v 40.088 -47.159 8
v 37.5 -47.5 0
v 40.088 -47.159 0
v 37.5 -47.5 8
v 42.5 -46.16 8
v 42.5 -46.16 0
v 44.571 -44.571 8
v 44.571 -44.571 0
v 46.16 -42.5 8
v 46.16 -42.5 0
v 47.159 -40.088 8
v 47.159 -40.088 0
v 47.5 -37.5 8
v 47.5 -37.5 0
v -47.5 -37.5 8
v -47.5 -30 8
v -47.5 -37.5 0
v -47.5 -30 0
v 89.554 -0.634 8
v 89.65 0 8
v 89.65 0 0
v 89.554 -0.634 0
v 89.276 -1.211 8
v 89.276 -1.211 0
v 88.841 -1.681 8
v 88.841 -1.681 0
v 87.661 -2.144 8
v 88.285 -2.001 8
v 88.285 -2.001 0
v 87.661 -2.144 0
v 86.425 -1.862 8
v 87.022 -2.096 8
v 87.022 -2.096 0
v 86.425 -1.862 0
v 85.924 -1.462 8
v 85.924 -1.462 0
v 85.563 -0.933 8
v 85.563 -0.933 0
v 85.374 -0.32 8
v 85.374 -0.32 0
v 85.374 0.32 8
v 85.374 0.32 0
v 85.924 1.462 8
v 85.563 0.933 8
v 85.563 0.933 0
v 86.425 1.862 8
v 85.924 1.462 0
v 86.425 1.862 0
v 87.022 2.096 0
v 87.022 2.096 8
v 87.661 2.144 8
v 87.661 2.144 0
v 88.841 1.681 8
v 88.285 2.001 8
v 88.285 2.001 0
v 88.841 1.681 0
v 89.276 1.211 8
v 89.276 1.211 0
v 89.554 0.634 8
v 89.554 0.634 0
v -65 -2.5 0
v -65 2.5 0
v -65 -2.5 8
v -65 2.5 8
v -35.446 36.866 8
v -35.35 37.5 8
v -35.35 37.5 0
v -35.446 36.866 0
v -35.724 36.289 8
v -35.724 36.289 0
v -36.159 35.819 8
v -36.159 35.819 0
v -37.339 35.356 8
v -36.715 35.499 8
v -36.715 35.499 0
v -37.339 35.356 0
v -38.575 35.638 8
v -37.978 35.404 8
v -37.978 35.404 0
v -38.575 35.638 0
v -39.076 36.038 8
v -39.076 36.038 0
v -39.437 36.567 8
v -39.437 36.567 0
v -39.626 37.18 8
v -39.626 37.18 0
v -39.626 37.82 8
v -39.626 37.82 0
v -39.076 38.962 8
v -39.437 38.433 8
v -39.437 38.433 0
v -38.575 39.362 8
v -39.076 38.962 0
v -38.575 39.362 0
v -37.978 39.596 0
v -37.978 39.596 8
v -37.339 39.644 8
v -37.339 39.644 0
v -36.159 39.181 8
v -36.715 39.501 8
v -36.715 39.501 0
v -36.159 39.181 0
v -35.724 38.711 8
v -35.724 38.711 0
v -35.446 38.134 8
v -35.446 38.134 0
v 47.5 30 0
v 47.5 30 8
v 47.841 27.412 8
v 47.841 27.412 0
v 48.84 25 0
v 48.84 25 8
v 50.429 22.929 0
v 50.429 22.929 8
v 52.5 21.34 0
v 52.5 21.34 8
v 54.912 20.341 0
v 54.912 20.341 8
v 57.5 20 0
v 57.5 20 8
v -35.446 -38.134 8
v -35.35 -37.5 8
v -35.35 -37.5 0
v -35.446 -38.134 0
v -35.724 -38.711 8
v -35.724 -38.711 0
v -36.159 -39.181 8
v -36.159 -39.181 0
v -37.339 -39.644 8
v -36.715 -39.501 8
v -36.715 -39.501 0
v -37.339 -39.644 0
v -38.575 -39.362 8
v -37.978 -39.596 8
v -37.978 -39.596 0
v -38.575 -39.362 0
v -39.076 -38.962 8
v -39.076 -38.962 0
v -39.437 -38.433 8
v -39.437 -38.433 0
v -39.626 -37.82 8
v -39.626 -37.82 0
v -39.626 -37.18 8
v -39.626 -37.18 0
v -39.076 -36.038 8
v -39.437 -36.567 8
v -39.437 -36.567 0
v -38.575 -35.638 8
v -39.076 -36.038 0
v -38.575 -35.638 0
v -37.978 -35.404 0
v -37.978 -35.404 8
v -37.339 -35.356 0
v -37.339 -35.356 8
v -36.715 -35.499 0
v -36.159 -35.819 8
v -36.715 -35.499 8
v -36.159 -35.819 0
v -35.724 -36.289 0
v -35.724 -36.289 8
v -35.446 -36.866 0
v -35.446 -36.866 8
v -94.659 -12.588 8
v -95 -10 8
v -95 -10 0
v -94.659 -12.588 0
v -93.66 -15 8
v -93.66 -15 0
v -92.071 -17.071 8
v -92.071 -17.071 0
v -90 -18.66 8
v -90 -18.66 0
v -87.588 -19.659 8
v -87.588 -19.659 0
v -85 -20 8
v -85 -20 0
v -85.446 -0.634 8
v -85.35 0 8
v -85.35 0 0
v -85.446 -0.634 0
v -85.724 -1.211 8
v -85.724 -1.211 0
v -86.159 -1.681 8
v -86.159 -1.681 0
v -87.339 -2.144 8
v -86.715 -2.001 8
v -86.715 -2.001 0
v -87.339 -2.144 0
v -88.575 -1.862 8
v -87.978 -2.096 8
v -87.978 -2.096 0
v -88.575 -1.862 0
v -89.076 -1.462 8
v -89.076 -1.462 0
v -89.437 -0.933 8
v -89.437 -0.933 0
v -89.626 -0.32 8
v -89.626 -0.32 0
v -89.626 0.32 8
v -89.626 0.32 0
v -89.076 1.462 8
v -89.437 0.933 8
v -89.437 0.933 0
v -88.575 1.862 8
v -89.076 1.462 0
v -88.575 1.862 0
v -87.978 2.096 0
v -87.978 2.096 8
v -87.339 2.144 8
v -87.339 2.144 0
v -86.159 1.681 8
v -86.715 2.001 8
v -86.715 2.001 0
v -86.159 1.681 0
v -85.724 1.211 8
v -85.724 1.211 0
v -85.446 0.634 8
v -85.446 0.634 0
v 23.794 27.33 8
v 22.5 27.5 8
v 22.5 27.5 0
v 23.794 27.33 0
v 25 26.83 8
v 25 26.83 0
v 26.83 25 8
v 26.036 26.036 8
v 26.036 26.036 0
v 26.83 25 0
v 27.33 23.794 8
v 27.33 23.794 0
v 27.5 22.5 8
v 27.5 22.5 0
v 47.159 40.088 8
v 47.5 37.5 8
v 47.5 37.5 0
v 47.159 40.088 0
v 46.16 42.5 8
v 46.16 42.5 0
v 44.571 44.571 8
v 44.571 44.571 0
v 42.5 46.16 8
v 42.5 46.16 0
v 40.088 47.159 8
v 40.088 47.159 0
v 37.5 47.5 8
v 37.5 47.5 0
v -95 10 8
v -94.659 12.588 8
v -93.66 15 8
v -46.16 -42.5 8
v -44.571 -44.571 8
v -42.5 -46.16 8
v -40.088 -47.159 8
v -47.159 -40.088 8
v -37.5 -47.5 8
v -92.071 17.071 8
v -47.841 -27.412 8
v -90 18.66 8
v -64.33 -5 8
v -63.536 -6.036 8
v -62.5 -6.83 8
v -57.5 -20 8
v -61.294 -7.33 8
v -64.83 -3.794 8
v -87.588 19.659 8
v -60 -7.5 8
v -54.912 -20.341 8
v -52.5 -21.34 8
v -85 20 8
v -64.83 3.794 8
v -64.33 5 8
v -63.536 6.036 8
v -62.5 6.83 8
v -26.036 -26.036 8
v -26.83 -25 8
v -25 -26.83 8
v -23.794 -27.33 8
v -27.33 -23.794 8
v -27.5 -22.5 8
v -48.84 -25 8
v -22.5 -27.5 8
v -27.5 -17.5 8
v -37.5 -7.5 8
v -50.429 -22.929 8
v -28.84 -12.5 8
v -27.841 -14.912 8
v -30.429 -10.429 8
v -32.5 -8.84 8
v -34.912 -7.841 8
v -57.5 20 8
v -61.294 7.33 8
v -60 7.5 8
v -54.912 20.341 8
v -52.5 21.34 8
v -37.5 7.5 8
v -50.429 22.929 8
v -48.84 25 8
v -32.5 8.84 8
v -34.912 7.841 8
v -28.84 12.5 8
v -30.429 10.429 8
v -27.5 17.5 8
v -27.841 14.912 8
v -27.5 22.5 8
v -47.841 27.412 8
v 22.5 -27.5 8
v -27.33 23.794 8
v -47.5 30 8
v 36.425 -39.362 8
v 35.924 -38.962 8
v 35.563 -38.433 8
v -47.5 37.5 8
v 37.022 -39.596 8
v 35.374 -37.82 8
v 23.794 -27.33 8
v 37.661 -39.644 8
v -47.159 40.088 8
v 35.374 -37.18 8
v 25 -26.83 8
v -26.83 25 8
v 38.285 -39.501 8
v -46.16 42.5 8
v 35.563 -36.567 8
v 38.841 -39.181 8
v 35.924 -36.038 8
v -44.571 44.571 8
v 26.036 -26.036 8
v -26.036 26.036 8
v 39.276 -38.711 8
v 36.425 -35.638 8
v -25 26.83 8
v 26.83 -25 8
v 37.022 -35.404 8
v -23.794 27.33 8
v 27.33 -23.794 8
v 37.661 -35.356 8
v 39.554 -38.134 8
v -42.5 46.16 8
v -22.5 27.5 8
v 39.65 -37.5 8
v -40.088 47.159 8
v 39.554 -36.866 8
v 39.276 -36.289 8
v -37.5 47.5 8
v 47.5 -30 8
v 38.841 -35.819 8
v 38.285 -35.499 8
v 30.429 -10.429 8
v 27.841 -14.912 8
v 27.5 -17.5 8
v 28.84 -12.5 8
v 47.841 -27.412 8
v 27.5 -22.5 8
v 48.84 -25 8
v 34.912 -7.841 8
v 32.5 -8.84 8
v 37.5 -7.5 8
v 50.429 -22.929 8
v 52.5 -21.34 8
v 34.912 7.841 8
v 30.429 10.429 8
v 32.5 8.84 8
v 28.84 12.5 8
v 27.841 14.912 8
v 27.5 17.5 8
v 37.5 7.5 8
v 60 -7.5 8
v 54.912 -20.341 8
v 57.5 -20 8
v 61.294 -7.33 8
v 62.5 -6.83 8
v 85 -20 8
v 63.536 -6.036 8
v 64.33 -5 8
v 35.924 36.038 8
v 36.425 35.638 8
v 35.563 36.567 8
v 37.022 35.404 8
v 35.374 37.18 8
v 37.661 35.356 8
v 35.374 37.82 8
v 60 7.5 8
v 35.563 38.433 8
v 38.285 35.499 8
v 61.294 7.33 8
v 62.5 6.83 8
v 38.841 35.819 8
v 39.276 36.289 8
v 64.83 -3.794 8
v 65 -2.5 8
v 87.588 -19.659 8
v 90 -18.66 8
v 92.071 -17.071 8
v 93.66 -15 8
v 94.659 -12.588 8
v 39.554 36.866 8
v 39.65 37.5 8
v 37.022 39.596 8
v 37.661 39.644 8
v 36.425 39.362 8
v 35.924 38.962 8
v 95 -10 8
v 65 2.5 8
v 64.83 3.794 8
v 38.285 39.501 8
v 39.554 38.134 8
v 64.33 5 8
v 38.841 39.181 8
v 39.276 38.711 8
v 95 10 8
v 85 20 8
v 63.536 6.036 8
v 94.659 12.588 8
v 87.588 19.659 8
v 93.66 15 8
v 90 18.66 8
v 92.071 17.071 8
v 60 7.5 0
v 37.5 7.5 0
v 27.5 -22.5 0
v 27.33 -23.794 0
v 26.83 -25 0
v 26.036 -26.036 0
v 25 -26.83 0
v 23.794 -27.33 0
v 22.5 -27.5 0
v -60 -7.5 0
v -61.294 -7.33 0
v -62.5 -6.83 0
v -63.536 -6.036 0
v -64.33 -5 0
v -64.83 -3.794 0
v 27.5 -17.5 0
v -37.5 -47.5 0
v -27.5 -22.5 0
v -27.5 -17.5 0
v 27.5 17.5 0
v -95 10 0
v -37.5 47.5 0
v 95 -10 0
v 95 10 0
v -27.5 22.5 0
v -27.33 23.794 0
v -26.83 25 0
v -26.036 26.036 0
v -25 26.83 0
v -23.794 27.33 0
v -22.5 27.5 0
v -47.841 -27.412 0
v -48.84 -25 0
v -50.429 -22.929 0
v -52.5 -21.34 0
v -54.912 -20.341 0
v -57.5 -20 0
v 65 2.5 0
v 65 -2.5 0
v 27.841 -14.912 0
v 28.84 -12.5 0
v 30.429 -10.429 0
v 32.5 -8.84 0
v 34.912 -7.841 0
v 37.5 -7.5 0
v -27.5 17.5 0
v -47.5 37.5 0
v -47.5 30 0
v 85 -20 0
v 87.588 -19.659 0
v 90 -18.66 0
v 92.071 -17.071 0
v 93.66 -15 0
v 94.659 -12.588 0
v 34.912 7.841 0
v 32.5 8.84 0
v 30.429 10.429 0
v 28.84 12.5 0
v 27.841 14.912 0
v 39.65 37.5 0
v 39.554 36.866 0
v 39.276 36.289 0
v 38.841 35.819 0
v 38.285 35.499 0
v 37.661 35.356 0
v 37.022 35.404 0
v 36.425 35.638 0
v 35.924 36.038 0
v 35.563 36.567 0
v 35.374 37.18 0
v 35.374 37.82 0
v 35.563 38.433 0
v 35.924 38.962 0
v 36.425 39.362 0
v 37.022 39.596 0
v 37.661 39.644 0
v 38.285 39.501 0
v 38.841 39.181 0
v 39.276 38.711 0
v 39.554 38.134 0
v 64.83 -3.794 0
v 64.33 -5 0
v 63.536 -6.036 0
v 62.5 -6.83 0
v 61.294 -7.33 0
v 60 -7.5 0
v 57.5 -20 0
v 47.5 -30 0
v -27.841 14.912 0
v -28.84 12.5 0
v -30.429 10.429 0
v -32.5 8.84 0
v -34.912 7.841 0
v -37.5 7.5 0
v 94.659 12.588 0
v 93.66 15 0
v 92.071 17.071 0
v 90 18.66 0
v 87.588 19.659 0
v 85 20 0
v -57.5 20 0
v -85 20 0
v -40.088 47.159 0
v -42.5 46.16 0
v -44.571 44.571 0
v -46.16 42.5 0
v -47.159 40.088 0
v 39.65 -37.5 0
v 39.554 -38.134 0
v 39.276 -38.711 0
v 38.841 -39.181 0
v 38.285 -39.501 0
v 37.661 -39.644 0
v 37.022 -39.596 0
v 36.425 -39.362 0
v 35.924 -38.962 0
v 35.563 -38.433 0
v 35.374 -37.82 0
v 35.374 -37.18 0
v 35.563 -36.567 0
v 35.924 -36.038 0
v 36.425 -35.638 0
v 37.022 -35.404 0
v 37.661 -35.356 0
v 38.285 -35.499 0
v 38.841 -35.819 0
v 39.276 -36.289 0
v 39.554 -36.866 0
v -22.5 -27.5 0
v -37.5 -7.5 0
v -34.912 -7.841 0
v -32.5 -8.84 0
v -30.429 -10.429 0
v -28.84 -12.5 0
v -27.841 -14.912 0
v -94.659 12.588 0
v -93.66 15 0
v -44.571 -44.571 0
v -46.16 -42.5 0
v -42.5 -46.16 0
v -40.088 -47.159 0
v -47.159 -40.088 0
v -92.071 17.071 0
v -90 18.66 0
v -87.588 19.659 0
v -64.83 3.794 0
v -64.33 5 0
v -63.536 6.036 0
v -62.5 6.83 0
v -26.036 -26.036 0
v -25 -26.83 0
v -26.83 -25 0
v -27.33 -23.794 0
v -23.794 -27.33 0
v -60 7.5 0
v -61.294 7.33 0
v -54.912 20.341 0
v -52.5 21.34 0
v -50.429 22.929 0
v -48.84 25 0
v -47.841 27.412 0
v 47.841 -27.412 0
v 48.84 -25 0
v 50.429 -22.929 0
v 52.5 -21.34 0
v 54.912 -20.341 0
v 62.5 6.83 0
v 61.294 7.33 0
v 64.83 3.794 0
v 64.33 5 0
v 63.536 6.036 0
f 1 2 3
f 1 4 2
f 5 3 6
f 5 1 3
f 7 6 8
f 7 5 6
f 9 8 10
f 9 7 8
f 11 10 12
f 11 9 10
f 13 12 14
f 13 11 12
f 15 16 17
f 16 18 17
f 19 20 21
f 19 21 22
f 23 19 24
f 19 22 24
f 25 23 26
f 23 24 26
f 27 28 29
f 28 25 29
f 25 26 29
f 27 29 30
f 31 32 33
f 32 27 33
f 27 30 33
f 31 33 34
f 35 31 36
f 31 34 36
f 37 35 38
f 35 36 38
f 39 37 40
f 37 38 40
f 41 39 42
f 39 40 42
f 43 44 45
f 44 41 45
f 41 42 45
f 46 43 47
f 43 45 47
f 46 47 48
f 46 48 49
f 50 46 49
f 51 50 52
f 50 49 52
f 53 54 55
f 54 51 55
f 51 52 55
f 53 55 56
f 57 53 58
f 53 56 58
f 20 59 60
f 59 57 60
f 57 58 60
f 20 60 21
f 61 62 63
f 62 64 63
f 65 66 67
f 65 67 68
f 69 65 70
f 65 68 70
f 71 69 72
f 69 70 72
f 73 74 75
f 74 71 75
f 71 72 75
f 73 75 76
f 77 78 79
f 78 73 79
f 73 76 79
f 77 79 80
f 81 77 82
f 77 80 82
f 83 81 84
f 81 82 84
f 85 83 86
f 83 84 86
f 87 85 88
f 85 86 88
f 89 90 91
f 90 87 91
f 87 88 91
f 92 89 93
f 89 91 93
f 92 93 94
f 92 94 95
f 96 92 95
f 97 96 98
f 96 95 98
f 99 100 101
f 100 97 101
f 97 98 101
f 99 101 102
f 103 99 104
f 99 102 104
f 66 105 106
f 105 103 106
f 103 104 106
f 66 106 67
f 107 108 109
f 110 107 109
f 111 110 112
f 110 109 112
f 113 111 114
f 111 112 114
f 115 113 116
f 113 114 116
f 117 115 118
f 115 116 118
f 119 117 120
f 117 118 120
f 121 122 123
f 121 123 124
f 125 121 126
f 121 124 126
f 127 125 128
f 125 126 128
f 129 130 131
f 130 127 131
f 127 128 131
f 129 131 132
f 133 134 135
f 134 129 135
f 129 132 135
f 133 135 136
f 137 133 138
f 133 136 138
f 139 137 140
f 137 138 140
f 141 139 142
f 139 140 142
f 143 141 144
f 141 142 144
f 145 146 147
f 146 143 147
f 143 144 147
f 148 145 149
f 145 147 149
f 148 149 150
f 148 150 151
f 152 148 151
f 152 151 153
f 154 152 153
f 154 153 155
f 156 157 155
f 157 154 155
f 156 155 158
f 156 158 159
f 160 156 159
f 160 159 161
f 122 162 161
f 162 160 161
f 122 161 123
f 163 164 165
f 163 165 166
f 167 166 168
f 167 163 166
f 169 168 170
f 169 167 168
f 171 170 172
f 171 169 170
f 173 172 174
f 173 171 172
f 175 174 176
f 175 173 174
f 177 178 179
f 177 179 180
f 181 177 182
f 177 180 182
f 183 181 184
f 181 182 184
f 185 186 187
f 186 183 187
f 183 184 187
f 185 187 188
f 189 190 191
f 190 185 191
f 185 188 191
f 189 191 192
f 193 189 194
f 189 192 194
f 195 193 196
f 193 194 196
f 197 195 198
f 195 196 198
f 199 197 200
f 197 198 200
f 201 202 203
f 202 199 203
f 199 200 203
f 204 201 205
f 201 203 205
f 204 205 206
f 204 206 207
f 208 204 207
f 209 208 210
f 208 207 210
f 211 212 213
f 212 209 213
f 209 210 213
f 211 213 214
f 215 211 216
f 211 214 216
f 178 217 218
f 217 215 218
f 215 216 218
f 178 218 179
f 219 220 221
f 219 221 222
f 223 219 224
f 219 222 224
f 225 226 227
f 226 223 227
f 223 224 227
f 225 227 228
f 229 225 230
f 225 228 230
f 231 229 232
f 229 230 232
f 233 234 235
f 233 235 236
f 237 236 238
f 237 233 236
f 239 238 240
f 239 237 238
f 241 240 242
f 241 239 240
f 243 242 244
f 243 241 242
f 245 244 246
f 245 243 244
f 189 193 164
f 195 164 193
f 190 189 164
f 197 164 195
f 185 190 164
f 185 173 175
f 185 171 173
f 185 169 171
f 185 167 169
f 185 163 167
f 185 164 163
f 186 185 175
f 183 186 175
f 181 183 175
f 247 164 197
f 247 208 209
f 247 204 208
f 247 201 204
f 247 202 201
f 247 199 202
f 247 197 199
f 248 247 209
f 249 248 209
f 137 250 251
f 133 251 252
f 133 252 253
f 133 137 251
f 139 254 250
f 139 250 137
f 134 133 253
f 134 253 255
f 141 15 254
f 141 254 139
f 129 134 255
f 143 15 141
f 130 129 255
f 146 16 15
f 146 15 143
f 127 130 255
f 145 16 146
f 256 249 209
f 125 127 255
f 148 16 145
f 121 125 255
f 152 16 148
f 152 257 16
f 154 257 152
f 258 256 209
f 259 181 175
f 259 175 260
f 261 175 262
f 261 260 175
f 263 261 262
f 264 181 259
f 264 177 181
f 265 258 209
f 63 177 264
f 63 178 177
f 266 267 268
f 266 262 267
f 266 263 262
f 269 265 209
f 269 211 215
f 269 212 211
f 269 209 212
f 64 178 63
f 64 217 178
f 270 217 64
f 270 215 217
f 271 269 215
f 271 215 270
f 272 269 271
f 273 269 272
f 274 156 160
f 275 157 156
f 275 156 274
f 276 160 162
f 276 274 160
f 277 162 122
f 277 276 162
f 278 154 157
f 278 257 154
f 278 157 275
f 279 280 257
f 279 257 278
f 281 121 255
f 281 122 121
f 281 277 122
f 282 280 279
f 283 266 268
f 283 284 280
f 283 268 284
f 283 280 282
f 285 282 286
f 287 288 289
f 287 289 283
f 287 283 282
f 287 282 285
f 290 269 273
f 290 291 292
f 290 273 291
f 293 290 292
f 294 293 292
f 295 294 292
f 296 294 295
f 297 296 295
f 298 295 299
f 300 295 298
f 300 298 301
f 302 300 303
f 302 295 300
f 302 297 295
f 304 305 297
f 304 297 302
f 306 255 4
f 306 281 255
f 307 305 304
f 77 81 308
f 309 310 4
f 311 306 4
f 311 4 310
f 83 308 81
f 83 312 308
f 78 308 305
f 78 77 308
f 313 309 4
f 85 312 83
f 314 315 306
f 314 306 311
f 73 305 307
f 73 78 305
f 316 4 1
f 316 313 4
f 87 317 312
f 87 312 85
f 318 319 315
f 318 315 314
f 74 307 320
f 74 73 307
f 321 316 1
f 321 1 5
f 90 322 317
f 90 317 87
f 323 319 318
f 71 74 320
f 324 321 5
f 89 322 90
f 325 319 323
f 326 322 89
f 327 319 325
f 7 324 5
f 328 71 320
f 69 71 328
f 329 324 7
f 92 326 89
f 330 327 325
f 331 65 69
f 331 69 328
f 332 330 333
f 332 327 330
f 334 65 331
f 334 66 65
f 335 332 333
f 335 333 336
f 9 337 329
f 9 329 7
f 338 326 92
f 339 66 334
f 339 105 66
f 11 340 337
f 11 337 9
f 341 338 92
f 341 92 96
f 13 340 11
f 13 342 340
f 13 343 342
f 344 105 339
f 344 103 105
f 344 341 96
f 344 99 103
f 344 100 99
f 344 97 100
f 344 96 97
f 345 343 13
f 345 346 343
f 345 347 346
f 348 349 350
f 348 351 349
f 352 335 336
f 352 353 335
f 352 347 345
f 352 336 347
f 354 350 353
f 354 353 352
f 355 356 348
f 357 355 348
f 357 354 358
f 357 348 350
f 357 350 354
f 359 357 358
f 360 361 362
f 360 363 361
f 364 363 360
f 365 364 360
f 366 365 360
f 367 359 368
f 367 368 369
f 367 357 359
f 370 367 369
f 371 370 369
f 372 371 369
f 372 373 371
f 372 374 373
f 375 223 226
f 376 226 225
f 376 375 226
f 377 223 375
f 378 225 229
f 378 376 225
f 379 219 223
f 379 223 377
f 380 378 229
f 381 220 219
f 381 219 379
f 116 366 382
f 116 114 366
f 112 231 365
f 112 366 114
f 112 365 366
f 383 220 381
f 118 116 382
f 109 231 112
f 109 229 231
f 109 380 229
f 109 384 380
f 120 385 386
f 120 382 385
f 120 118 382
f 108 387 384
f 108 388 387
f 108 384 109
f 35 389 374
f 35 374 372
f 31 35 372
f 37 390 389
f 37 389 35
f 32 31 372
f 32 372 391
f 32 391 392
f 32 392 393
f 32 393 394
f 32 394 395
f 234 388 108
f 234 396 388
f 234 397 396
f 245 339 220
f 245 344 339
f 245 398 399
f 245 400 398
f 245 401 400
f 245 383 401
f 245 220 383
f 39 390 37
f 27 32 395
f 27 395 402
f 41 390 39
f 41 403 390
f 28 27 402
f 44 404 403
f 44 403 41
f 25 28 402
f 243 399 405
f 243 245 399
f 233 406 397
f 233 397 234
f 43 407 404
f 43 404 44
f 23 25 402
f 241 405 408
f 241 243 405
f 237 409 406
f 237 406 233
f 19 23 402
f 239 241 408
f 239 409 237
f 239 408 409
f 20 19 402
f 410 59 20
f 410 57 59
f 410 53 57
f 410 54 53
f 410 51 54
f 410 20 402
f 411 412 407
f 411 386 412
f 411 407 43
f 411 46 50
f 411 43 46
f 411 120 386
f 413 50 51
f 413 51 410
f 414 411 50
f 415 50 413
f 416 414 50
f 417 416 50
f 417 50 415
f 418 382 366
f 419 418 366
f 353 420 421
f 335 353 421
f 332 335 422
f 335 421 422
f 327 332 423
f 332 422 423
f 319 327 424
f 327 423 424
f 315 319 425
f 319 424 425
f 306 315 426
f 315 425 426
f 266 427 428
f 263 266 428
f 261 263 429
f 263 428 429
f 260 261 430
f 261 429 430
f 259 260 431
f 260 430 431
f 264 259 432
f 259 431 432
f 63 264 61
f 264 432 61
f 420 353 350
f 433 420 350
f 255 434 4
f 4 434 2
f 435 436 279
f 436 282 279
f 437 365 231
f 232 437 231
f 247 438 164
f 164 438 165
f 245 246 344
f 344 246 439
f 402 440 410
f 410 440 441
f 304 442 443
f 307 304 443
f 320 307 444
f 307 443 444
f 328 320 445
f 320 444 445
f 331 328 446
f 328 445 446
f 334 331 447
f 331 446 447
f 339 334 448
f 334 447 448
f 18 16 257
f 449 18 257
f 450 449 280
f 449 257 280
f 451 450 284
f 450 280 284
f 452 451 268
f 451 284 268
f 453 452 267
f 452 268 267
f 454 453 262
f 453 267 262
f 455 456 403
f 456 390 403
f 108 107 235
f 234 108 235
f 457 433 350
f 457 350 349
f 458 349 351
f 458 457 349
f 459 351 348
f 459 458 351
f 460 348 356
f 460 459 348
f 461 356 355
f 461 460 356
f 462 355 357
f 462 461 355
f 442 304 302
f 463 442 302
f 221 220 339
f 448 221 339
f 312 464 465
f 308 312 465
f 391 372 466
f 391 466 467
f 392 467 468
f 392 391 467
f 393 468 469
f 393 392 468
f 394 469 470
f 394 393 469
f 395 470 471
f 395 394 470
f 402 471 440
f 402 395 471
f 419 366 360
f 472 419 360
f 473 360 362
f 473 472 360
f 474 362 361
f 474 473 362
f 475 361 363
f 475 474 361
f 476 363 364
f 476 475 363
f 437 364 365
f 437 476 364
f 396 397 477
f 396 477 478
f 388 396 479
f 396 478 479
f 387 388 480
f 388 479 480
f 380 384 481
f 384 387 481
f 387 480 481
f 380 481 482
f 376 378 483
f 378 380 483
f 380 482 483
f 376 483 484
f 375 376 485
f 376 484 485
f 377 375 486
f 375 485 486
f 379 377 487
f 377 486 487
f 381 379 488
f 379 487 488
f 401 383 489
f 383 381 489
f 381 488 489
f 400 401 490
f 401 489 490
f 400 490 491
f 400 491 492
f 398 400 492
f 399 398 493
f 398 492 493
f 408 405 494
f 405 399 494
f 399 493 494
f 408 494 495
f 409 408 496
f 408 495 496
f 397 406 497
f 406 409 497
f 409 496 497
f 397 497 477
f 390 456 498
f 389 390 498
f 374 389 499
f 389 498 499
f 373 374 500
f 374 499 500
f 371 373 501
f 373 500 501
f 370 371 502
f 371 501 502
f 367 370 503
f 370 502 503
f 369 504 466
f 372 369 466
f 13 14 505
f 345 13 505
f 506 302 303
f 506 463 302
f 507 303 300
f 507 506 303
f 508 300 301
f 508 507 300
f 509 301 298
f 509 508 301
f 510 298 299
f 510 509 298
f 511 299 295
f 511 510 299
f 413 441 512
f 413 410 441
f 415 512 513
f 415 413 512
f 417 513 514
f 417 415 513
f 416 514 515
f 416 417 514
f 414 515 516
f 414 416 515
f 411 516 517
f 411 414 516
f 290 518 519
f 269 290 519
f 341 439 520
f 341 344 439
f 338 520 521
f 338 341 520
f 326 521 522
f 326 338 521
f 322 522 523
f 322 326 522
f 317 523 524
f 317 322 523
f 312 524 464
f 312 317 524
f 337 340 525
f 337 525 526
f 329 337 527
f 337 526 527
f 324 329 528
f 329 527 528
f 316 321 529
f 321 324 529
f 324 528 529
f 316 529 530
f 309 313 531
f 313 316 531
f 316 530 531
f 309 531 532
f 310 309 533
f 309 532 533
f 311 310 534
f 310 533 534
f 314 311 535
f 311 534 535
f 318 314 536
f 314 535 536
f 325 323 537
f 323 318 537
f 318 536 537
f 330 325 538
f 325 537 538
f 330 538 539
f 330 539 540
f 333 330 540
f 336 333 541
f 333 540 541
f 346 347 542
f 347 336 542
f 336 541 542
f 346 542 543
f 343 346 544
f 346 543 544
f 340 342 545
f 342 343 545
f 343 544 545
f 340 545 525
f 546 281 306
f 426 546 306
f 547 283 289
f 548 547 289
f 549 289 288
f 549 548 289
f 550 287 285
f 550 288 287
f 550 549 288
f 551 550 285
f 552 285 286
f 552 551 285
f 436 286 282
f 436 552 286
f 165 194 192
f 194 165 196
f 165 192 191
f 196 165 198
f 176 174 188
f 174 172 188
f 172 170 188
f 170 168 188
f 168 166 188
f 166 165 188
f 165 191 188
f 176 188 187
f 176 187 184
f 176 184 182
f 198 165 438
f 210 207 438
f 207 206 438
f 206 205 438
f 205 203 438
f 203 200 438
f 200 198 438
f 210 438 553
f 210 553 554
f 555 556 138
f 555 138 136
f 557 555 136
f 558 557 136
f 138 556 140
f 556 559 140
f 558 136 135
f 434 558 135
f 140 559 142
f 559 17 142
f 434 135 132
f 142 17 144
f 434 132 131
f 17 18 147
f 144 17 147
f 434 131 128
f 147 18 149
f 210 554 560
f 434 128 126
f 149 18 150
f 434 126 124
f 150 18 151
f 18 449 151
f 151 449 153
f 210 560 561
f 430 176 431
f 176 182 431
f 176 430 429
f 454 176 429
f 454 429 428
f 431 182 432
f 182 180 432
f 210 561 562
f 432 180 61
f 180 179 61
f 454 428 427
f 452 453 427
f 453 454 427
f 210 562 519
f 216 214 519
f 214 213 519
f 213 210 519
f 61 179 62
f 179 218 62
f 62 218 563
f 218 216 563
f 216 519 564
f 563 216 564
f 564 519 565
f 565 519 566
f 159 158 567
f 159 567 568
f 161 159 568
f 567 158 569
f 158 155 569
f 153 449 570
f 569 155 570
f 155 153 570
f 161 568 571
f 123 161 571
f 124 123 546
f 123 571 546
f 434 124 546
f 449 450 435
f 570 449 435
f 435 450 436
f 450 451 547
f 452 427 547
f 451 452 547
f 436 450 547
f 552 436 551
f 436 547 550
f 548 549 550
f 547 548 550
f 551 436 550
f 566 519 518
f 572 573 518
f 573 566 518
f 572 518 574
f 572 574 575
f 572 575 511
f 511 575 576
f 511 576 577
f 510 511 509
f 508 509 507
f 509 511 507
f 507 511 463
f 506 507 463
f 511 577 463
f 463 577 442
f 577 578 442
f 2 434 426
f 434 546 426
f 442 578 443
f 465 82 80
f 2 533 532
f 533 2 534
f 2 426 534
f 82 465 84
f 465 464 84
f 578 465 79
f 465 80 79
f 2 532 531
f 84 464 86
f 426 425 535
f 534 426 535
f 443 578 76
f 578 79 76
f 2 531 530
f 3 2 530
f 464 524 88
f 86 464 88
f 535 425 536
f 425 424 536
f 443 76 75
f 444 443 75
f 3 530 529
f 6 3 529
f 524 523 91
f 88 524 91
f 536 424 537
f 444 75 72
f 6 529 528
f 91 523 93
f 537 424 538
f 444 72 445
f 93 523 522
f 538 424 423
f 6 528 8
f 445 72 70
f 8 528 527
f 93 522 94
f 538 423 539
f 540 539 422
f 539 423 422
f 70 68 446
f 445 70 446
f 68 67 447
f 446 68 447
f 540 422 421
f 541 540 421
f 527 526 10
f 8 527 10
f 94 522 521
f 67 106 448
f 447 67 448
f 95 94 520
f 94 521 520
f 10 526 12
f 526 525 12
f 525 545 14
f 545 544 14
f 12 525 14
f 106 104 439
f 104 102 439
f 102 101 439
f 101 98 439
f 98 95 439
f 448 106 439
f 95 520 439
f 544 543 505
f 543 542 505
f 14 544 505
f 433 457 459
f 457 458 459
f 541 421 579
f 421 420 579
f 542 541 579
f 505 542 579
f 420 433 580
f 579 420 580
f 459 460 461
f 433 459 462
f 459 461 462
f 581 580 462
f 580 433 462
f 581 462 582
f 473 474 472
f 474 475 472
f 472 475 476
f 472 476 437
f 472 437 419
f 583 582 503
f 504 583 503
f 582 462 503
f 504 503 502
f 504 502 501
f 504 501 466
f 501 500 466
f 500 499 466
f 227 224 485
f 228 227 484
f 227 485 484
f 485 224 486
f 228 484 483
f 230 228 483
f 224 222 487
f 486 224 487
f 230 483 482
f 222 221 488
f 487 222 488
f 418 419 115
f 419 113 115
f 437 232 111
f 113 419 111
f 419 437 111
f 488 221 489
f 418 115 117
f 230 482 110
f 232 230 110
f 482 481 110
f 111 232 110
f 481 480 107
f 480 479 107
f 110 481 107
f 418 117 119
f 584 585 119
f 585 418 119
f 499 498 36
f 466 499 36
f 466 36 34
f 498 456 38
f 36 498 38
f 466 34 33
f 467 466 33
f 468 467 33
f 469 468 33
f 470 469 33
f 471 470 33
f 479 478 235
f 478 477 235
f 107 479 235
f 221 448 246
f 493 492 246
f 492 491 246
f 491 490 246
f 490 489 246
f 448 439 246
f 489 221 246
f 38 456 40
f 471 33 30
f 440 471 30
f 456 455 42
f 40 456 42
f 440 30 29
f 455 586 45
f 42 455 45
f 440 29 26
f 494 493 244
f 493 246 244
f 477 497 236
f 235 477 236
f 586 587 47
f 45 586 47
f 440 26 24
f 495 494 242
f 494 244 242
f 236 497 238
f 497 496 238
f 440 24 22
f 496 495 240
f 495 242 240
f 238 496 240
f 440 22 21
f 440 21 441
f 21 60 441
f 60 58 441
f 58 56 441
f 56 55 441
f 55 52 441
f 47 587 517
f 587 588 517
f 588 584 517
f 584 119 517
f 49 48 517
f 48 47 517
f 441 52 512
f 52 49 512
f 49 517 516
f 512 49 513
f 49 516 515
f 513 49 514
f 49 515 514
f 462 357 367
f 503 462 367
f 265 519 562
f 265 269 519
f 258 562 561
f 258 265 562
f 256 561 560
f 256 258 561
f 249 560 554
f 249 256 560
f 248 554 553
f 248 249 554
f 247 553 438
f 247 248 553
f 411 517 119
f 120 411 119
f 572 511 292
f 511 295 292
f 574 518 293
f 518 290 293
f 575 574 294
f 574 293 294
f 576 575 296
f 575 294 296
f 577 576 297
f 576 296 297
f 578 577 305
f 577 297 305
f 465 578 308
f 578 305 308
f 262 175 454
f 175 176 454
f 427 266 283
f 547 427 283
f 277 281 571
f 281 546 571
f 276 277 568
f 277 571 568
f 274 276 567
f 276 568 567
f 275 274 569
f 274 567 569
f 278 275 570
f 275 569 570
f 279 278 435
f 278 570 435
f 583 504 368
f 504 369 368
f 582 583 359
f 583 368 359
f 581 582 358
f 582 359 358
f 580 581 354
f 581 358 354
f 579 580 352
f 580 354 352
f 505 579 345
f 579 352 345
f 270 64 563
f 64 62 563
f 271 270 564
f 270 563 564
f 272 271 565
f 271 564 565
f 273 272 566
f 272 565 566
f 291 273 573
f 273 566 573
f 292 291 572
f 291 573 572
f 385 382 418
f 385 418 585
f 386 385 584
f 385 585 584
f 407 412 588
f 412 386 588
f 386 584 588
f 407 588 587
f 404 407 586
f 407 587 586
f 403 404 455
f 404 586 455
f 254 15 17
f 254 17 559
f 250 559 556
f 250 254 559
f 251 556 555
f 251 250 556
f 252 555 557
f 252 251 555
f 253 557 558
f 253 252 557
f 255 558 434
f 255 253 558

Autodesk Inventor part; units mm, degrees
ref_plane "YZ Plane" through (0, 0, 0) normal (1, 0, 0) x (0, 1, 0)
ref_plane "XZ Plane" through (0, 0, 0) normal (0, 1, 0) x (-1, 0, 0)
ref_plane "XY Plane" through (0, 0, 0) normal (0, 0, 1) x (1, 0, 0)
sketch "Sketch1" plane through (0, 0, 0) normal (0, 0, 1) x (1, 0, 0)
  line L0 (-50, -50) -> (50, -50) construction
  line L1 (50, -50) -> (50, 50) construction
  line L2 (50, 50) -> (-50, 50) construction
  line L3 (-50, 50) -> (-50, -50) construction
  line L4 (-50, -50) -> (50, 50) construction
  line L5 (50, -50) -> (-50, 50) construction
  line L6 (-37.5, -37.5) -> (37.5, -37.5) construction
  line L7 (37.5, -37.5) -> (37.5, 37.5) construction
  line L8 (37.5, 37.5) -> (-37.5, 37.5) construction
  line L9 (-37.5, 37.5) -> (-37.5, -37.5) construction
  line L10 (-37.5, -37.5) -> (37.5, 37.5) construction
  line L11 (37.5, -37.5) -> (-37.5, 37.5) construction
  line L12 (-47.5, -47.5) -> (47.5, -47.5)
  line L13 (47.5, -47.5) -> (47.5, 47.5)
  line L14 (47.5, 47.5) -> (-47.5, 47.5)
  line L15 (-47.5, 47.5) -> (-47.5, -47.5)
  line L16 (-47.5, -47.5) -> (47.5, 47.5) construction
  line L17 (47.5, -47.5) -> (-47.5, 47.5) construction
  circle A0 centre (-50, 50) radius 2.15
  circle A1 centre (-37.5, 37.5) radius 2.15
  circle A2 centre (37.5, 37.5) radius 2.15
  circle A3 centre (-37.5, -37.5) radius 2.15
  circle A4 centre (37.5, -37.5) radius 2.15
  circle A5 centre (50, 50) radius 2.15
  circle A6 centre (-50, -50) radius 2.15
  circle A7 centre (50, -50) radius 2.15
  line L18 (-95, -20) -> (95, -20)
  line L19 (95, -20) -> (95, 20)
  line L20 (95, 20) -> (-95, 20)
  line L21 (-95, 20) -> (-95, -20)
  line L22 (-95, -20) -> (95, 20) construction
  line L23 (95, -20) -> (-95, 20) construction
  circle A8 centre (87.5, 0) radius 2.15
  line L24 (0, 0) -> (0, 12.464) construction
  circle A9 centre (-87.5, 0) radius 2.15
  point P0 (-47.5, -20)
  point P1 (-47.5, 20)
  point P2 (47.5, 20)
  point P3 (47.5, -20)
  dimension "d0" = 100
  dimension "d1" = 100
  dimension "d2" = 75
  dimension "d3" = 75
  dimension "d4" = 95
  dimension "d5" = 95
  dimension "d6" = 4.3
  dimension "d7" = 4.3
  dimension "d10" = 75
  dimension "d13" = 75
  dimension "d18" = 100
  dimension "d21" = 100
  dimension "d31" = 40
  dimension "d32" = 4.3
  dimension "d33" = 87.5
  dimension "d34" = 7.5
extrude "Extrusion1" add sketch "Sketch1" along normal blind 8 contours L15 L18 L13 L12 | L18 L21 L20 L15 | L15 L20 L13 L18 | L13 L20 L19 L18 | L15 L14 L13 L20
sketch "Sketch3" plane through (0, 0, 8) normal (0, 0, 1) x (1, 0, 0)
  line L0 (47.5, 47.5) -> (-47.5, 47.5) projected
  line L1 (-47.5, 47.5) -> (-47.5, 20) projected
  line L2 (-47.5, 20) -> (-95, 20) projected
  line L3 (-95, 20) -> (-95, -20) projected
  line L4 (-95, -20) -> (-47.5, -20) projected
  line L5 (-47.5, -20) -> (-47.5, -47.5) projected
  line L6 (-47.5, -47.5) -> (47.5, -47.5) projected
  line L7 (47.5, -47.5) -> (47.5, -20) projected
  line L8 (47.5, -20) -> (95, -20) projected
  line L9 (95, -20) -> (95, 20) projected
  line L10 (95, 20) -> (47.5, 20) projected
  line L11 (47.5, 20) -> (47.5, 47.5) projected
  line L12 (-27.5, -27.5) -> (27.5, -27.5)
  line L13 (27.5, -27.5) -> (27.5, 27.5)
  line L14 (27.5, 27.5) -> (-27.5, 27.5)
  line L15 (-27.5, 27.5) -> (-27.5, -27.5)
  line L16 (-27.5, -27.5) -> (27.5, 27.5) construction
  line L17 (27.5, -27.5) -> (-27.5, 27.5) construction
  line L18 (-65, -7.5) -> (65, -7.5)
  line L19 (65, -7.5) -> (65, 7.5)
  line L20 (65, 7.5) -> (-65, 7.5)
  line L21 (-65, 7.5) -> (-65, -7.5)
  line L22 (-65, -7.5) -> (65, 7.5) construction
  line L23 (65, -7.5) -> (-65, 7.5) construction
  point P0 (0, 0)
  point P1 (-27.5, 7.5)
  point P2 (-27.5, -7.5)
  point P3 (27.5, -7.5)
  point P4 (27.5, 7.5)
  dimension "d35" = 55
  dimension "d36" = 55
  dimension "d37" = 130
  dimension "d38" = 15
extrude "Extrusion3" cut sketch "Sketch3" against normal through all contours L15 L18 L13 L12 | L18 L21 L20 L15 | L15 L20 L13 L18 | L13 L20 L19 L18 | L15 L14 L13 L20
fillet "Fillet1" radius 10 16 edges at (-47.5, -47.5, 4) (-47.5, -20, 4) (-95, -20, 4) (-47.5, 47.5, 4) (-95, 20, 4) (47.5, 47.5, 4) (95, 20, 4) (47.5, 20, 4) (95, -20, 4) (47.5, -20, 4) (47.5, -47.5, 4) (-47.5, 20, 4) (27.5, -7.5, 4) (27.5, 7.5, 4) (-27.5, 7.5, 4) (-27.5, -7.5, 4)
fillet "Fillet1" radius 5 8 edges at (27.5, 27.5, 4) (65, 7.5, 4) (65, -7.5, 4) (27.5, -27.5, 4) (-27.5, -27.5, 4) (-27.5, 27.5, 4) (-65, -7.5, 4) (-65, 7.5, 4)
equation "\"d1\" = d0"
equation "\"d5\" = d4"
equation "\"d35\" = d36"
properties part number "Power_box"
